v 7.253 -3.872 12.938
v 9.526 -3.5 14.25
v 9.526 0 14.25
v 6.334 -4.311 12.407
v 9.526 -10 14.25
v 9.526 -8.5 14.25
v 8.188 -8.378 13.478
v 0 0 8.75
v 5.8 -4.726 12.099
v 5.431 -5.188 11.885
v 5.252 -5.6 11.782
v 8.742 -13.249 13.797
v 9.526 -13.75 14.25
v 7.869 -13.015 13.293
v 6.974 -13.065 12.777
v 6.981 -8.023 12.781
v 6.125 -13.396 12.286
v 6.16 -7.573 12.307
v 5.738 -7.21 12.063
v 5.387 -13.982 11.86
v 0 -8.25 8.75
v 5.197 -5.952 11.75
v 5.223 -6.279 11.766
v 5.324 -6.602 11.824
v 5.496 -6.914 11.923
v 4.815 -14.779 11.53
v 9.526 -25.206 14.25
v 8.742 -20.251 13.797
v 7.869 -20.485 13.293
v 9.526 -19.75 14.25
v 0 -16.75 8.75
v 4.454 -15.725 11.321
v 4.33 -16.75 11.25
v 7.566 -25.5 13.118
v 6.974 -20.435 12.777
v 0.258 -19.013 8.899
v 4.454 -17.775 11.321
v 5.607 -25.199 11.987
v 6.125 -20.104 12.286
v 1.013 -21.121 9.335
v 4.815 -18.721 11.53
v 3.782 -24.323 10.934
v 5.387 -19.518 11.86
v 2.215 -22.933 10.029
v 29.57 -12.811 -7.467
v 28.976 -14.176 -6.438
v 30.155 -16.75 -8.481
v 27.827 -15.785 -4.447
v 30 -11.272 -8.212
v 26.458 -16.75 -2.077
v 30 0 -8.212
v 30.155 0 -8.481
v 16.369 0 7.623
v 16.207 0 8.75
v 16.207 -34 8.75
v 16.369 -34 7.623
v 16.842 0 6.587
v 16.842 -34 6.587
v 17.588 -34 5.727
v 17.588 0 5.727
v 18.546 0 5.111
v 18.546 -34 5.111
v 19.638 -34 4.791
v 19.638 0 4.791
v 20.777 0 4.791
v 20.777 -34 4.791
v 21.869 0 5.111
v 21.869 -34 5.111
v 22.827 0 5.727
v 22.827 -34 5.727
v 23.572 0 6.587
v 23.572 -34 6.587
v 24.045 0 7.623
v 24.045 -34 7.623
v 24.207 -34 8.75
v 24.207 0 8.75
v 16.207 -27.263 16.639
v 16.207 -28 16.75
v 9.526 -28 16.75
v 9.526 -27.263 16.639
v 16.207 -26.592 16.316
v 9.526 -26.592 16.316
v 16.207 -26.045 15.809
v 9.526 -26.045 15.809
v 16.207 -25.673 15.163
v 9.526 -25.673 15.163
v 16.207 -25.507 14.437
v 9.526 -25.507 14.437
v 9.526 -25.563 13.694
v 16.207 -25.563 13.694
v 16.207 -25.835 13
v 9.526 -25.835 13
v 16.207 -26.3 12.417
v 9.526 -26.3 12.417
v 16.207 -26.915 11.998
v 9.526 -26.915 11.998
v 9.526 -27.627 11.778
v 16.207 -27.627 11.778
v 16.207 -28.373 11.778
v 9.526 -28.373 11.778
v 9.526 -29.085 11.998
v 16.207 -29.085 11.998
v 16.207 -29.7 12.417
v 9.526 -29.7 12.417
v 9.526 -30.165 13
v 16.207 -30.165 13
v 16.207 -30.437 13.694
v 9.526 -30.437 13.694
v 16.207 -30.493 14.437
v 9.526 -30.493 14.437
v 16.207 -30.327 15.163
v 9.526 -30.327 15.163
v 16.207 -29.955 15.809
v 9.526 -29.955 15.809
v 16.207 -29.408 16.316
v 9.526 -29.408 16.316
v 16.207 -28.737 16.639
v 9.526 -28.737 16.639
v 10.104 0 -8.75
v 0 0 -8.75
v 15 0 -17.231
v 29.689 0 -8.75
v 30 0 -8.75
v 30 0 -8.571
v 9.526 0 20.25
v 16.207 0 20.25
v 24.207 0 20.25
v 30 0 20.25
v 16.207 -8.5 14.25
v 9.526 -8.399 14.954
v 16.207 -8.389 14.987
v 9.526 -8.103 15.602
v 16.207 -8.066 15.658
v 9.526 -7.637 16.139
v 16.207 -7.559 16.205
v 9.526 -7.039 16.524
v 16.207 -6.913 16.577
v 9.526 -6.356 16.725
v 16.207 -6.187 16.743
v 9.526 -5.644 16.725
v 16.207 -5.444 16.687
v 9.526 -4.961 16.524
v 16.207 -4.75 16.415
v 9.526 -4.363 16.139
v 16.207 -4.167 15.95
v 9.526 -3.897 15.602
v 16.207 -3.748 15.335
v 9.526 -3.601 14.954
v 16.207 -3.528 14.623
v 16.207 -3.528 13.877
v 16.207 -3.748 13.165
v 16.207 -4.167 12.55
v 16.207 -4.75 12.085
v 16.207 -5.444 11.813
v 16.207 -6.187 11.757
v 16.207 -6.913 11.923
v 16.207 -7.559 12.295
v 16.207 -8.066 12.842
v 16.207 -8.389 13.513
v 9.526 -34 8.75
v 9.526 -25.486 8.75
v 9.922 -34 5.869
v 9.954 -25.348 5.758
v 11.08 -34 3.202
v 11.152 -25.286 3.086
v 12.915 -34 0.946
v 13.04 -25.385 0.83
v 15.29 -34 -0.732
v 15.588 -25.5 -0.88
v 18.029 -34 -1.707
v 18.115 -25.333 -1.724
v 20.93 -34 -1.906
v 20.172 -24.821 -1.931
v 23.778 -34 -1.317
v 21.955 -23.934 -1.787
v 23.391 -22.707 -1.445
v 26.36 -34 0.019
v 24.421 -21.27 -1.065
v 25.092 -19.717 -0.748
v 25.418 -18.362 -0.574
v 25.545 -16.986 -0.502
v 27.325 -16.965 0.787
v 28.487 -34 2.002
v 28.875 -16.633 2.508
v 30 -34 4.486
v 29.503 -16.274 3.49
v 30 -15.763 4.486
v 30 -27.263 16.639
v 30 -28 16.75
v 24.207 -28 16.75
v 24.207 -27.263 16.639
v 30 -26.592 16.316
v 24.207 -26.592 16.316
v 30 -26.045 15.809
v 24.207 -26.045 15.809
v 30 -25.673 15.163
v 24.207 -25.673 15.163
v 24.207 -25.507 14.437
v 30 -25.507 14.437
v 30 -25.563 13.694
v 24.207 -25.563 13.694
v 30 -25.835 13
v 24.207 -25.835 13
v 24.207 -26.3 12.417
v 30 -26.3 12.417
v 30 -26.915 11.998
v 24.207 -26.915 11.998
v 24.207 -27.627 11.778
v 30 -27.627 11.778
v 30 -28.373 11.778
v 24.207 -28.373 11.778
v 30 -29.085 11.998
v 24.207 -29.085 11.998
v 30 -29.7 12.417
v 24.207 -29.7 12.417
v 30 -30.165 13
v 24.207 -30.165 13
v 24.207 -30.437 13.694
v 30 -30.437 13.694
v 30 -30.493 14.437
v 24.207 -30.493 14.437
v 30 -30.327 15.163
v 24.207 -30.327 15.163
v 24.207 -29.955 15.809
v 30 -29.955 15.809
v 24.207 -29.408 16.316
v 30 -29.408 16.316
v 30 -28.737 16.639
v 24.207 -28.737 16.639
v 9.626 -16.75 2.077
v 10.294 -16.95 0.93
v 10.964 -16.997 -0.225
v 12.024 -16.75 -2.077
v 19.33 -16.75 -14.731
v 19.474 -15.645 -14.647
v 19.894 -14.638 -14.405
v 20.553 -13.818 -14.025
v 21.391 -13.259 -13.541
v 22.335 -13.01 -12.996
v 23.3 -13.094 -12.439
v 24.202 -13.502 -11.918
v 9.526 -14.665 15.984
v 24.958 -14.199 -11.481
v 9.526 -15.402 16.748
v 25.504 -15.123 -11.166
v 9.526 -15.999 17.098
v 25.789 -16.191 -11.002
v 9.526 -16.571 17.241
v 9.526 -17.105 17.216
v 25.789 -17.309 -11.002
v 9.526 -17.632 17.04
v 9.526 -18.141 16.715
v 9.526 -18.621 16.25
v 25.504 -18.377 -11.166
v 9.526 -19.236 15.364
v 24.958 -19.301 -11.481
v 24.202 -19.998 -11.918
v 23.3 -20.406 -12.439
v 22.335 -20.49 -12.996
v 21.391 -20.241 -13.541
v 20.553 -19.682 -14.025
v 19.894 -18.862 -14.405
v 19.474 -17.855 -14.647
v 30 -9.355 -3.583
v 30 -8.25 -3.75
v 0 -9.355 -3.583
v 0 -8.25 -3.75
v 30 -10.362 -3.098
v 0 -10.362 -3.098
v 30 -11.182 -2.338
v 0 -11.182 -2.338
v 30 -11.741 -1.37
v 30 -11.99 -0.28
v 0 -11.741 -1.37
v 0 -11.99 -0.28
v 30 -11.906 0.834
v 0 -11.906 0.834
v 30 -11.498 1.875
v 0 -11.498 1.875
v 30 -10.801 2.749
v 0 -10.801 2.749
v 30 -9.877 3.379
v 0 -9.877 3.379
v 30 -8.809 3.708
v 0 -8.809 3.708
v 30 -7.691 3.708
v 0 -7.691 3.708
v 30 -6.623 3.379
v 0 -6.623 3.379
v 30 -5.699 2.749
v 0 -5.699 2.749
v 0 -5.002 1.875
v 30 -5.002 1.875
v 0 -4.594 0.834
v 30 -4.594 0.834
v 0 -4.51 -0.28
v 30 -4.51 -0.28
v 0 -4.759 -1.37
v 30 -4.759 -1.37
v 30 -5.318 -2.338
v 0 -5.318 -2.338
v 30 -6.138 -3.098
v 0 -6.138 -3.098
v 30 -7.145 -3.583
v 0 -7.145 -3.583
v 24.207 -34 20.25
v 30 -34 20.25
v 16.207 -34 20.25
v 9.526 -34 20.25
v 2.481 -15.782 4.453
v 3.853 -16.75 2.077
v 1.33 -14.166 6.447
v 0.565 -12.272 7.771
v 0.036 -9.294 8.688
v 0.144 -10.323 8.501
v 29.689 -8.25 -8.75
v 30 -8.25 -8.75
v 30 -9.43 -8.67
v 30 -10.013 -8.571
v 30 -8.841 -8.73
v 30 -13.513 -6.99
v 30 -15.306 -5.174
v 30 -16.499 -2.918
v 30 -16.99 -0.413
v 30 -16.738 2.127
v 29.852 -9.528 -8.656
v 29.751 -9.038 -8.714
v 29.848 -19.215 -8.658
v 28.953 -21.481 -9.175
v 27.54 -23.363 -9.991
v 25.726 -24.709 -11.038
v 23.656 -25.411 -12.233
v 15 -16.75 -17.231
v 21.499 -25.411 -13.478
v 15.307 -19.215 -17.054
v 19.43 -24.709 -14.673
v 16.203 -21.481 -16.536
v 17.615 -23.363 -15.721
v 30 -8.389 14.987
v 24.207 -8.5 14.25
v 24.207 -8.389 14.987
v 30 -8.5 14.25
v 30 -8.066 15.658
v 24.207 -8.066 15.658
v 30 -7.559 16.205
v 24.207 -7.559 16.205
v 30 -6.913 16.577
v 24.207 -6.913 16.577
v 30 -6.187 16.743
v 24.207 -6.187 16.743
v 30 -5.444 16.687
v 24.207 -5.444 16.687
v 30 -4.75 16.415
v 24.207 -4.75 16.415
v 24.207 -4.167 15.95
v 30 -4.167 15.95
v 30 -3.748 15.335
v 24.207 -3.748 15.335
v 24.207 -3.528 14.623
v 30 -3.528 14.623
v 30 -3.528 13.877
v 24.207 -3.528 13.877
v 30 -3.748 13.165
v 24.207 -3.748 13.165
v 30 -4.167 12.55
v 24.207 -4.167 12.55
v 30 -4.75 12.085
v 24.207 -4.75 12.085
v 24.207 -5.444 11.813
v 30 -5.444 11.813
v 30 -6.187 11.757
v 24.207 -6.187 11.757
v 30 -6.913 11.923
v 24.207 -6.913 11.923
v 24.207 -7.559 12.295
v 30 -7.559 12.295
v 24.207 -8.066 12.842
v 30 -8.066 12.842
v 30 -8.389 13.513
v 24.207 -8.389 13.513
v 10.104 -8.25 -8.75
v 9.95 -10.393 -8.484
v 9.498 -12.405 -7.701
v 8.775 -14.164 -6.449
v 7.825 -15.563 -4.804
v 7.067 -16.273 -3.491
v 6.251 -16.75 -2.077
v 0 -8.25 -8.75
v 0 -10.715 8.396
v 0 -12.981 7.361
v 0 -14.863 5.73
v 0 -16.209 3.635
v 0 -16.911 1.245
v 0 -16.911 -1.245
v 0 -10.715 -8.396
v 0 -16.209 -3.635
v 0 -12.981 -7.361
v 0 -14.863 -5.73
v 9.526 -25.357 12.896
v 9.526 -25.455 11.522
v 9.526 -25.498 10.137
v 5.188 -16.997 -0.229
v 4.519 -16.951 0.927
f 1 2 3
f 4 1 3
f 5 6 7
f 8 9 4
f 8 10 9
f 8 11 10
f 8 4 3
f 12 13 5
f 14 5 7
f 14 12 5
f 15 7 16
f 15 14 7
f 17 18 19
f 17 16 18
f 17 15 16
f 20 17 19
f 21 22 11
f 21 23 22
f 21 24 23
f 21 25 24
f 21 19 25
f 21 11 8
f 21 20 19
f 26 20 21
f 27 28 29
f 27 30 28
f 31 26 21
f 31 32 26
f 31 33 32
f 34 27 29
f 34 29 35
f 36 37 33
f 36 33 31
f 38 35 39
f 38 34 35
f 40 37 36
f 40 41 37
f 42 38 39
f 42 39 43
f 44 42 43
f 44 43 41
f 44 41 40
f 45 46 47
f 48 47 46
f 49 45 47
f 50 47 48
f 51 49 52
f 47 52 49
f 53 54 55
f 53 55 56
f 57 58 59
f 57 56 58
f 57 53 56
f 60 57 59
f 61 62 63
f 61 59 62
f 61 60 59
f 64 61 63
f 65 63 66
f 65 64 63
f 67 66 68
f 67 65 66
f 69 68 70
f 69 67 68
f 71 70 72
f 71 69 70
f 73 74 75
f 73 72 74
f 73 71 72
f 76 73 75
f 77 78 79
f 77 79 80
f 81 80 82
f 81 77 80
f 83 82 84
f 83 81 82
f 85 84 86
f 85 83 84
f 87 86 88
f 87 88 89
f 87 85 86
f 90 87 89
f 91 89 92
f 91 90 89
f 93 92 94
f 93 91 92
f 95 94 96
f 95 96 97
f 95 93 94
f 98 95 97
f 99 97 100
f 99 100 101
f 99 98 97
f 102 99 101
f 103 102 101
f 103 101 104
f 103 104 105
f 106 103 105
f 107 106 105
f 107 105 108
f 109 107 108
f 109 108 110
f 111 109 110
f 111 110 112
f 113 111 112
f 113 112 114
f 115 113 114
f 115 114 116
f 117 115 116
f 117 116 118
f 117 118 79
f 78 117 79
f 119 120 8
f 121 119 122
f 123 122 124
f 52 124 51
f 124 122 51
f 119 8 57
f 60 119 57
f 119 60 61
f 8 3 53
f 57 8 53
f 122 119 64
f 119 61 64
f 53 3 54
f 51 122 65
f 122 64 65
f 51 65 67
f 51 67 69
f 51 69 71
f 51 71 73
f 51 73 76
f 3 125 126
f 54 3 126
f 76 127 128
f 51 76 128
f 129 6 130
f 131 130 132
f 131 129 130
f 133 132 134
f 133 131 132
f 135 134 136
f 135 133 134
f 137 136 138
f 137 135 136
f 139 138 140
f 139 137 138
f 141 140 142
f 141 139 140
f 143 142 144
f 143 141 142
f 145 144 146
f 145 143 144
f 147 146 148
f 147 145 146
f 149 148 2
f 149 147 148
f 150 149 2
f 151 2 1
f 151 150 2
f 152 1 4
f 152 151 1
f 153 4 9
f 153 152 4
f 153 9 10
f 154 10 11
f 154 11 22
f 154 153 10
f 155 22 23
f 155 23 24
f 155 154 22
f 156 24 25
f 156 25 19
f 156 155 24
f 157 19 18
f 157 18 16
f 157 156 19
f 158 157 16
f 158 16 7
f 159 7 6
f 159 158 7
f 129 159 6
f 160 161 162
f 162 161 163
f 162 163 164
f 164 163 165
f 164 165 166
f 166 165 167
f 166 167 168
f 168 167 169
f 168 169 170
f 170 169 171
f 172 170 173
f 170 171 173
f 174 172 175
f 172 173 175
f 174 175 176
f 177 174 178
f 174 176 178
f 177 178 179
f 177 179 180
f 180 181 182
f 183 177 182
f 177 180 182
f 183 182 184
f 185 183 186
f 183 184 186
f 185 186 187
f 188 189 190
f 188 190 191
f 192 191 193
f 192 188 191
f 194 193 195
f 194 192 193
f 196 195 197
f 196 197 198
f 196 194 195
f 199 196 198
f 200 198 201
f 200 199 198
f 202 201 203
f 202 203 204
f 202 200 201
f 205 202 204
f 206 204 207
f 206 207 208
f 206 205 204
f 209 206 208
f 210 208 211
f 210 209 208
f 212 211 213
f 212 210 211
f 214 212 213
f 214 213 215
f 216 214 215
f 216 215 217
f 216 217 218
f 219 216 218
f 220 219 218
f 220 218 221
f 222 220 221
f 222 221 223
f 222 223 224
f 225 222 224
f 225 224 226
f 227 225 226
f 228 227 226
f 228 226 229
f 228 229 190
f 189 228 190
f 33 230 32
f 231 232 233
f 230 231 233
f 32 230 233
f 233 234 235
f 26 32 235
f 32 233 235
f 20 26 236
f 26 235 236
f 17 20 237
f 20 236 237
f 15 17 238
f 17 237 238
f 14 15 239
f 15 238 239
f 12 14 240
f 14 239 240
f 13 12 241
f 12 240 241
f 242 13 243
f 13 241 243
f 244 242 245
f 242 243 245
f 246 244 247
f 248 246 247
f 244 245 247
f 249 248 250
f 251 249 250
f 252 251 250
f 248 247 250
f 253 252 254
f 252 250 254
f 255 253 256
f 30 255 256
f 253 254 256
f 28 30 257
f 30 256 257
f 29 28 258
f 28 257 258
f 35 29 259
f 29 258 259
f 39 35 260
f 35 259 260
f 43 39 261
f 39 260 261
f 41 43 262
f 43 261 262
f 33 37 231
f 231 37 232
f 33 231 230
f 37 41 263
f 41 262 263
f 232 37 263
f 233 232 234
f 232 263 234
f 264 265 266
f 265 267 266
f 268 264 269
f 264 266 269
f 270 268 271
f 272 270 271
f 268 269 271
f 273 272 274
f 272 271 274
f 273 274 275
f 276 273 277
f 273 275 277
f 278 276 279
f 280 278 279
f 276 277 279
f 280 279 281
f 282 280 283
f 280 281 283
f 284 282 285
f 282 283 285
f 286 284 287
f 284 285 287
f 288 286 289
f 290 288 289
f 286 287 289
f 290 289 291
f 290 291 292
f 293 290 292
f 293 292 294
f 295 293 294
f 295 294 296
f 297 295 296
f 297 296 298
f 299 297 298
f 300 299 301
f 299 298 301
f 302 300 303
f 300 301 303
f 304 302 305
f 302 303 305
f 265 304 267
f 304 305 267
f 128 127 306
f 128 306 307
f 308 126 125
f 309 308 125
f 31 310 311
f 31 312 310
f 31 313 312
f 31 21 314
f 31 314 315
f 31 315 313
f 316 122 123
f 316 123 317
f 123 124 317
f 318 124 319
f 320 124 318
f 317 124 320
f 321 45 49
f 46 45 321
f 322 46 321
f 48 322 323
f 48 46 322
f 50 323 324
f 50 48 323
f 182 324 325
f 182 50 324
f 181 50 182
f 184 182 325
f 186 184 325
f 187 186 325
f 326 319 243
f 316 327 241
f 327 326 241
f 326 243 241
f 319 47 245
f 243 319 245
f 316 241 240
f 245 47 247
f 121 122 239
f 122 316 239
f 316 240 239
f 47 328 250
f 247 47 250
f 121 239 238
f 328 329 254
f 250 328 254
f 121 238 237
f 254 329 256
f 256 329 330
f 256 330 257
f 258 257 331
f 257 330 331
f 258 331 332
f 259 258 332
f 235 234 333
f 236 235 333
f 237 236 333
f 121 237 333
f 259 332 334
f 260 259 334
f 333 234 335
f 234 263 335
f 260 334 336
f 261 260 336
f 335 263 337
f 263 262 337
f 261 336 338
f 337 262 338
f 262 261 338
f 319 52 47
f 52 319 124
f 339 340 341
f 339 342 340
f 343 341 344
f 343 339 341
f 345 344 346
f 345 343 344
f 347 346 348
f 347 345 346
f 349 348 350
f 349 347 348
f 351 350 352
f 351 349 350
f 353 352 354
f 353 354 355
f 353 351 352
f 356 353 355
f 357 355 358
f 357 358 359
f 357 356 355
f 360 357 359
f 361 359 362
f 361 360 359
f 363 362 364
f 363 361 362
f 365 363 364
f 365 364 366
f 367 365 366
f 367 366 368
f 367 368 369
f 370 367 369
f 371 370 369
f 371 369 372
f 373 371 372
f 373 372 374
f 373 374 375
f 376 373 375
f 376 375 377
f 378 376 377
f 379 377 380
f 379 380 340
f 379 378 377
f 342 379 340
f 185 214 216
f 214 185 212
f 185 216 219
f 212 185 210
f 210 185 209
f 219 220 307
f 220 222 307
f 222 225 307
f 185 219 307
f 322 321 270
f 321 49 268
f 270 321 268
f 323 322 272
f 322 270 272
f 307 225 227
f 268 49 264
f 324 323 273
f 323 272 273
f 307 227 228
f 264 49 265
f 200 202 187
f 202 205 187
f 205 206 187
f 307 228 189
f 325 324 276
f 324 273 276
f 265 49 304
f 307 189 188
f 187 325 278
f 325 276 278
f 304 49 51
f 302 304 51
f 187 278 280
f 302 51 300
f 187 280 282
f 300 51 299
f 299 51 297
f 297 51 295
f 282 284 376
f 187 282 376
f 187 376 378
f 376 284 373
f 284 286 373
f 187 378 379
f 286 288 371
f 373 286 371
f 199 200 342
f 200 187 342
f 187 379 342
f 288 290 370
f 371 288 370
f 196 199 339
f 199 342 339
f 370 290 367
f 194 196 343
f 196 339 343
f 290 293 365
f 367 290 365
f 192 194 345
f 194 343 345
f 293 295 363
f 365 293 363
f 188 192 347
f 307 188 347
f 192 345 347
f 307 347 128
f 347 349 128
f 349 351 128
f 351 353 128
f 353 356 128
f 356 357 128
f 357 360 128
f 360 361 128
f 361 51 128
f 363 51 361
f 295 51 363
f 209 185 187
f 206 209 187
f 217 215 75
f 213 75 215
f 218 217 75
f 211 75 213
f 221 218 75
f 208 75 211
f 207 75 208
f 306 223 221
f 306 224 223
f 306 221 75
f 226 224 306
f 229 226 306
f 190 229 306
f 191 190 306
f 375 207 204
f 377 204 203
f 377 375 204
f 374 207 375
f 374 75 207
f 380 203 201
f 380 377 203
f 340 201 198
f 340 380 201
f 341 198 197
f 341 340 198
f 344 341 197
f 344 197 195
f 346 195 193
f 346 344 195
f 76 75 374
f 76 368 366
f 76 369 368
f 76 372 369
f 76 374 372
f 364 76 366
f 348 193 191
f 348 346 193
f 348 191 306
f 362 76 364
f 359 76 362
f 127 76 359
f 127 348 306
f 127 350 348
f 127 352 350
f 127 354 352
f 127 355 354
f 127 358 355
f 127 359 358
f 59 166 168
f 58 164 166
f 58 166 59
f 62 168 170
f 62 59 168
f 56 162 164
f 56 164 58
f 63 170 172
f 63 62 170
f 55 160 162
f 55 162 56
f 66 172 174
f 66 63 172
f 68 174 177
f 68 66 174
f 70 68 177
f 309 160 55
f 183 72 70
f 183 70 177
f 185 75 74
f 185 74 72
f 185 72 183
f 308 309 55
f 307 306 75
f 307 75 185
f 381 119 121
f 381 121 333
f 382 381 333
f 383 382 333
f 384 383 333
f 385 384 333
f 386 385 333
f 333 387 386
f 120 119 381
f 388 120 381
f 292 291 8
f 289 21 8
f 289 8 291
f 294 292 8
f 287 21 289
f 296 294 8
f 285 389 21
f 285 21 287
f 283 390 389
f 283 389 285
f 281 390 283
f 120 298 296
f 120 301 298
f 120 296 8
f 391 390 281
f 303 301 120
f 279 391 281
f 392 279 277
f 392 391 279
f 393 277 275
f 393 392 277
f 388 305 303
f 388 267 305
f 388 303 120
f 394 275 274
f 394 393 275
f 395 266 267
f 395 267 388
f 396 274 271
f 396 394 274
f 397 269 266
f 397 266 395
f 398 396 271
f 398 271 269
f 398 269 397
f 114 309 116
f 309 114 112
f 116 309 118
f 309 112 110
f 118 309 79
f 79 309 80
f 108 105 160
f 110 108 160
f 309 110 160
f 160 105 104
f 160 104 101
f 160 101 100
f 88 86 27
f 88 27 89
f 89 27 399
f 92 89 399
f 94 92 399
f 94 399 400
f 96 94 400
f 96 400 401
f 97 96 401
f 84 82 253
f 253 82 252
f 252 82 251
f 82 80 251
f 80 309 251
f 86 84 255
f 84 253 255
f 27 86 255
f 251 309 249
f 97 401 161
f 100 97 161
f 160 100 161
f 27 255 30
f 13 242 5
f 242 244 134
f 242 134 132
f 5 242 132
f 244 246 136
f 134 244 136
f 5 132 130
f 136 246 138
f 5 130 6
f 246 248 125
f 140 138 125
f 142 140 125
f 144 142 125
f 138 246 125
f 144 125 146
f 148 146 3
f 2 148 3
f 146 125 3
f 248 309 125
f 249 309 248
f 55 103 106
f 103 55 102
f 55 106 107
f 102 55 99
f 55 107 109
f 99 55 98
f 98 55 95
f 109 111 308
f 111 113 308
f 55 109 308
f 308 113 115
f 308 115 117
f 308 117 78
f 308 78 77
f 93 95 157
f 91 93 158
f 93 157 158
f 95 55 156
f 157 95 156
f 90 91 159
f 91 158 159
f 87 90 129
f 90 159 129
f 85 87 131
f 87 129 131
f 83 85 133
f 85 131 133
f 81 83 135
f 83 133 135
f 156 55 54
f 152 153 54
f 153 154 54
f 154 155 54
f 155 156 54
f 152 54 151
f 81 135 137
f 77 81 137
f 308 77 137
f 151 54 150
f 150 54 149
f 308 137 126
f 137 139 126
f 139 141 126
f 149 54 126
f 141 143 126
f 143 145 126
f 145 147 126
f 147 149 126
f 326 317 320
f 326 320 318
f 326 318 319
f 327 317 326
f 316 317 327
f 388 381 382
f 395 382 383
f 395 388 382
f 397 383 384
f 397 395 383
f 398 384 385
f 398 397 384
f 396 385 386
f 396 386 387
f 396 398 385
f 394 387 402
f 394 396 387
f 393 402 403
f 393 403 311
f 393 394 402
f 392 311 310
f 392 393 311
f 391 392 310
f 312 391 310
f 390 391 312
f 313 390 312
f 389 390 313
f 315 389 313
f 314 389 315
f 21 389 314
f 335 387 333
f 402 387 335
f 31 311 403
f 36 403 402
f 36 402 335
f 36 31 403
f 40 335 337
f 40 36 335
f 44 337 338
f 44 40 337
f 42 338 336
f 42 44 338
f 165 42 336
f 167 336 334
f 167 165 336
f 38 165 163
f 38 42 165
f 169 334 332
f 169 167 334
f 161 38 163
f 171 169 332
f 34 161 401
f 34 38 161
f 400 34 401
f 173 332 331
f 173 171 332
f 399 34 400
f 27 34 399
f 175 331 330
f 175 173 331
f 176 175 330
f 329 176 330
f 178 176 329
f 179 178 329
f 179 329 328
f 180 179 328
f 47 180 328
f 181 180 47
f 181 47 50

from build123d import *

# Parameters (mm, degrees)
SKETCH1_R               = 3.75
BOSS_EXTRUDE1_DEPTH     = 30
SKETCH2_R               = 3.75
BOSS_EXTRUDE2_DEPTH     = 30
CUT_EXTRUDE1_DEPTH      = 26.5000001
SKETCH4_W               = 5.792740578
SKETCH4_H               = 11.5
BOSS_EXTRUDE3_DEPTH     = 10
BOSS_EXTRUDE4_DEPTH     = 10
BOSS_EXTRUDE5_DEPTH     = 34
SKETCH5_R               = 2.5
CUT_EXTRUDE2_DEPTH      = 31.0000001
SKETCH7_R               = 3.75
CUT_EXTRUDE3_DEPTH      = 31.155444666
SKETCH8_R               = 3.75
CUT_EXTRUDE4_DEPTH      = 27.5
CUT_EXTRUDE4_DEPTH_BACK = 38.57772242


with BuildPart() as part:
    # Sketch1 → Boss-Extrude1 (new body)
    with BuildSketch(Plane(origin=(0, 0, 0), x_dir=(0, 0, -1), z_dir=(1, 0, 0))):
        with BuildLine():
            Line((-8.75, 0), (8.75, 0))
            Line((8.75, 0), (8.75, 8.25))
            ThreePointArc((8.75, 8.25), (0, 17), (-8.75, 8.25))
            Line((-8.75, 8.25), (-8.75, 0))
        make_face()
        with Locations((0, 8.25)):
            Circle(SKETCH1_R, mode=Mode.SUBTRACT)
    extrude(amount=BOSS_EXTRUDE1_DEPTH)

    # Sketch2 → Boss-Extrude2 (add)
    with BuildSketch(Plane(origin=(-3.788861142, 0, 6.5625), x_dir=(-0.866025404, 0, -0.5), z_dir=(0.5, 0, -0.866025404))):
        with BuildLine():
            Line((-4.375, 0), (-4.375, 16.75))
            ThreePointArc((-4.375, 16.75), (-13.125, 25.5), (-21.875, 16.75))
            Line((-21.875, 16.75), (-21.875, 0))
            Line((-21.875, 0), (-4.375, 0))
        make_face()
        with Locations((-13.125, 16.75)):
            Circle(SKETCH2_R, mode=Mode.SUBTRACT)
    extrude(amount=BOSS_EXTRUDE2_DEPTH)

    # Sketch3 → Cut-Extrude1 (cut, through all)
    with BuildSketch(Plane.XZ):
        with BuildLine():
            Line((24.207259422, 8.75), (24.207259422, 15.67820323))
            Line((24.207259422, 15.67820323), (16.207259422, 15.67820323))
            Line((16.207259422, 15.67820323), (16.207259422, 8.75))
            ThreePointArc((16.207259422, 8.75), (20.207259422, 4.75), (24.207259422, 8.75))
        make_face()
    extrude(amount=-CUT_EXTRUDE1_DEPTH, mode=Mode.SUBTRACT)

    # Sketch4 → Boss-Extrude3 (add)
    with BuildSketch(Plane.XZ):
        with Locations((27.103629711, 14.5)):
            Rectangle(SKETCH4_W, SKETCH4_H)
    extrude(amount=-BOSS_EXTRUDE3_DEPTH)

    # Sketch6 → Boss-Extrude4 (add)
    with BuildSketch(Plane.XZ):
        Polygon((16.207259422, 15.67820323), (16.207259422, 20.25), (9.526279442, 20.25), (9.526279442, 14.25), align=None)
    extrude(amount=-BOSS_EXTRUDE4_DEPTH)

    # Sketch9 → Boss-Extrude5 (add)
    with BuildSketch(Plane.XZ):
        with BuildLine():
            Line((16.207259422, 20.25), (9.526279442, 20.25))
            Line((9.526279442, 20.25), (9.526279442, 14.25))
            Line((9.526279442, 14.25), (9.526279442, 8.75))
            ThreePointArc((9.526279442, 8.75), (18.029270984, -1.706562518), (30, 4.485546307))
            Line((30, 4.485546307), (30, 20.25))
            Line((30, 20.25), (24.207259422, 20.25))
            Line((24.207259422, 20.25), (24.207259422, 8.75))
            ThreePointArc((24.207259422, 8.75), (20.207259422, 4.75), (16.207259422, 8.75))
            Line((16.207259422, 8.75), (16.207259422, 20.25))
        make_face()
    extrude(amount=-BOSS_EXTRUDE5_DEPTH)

    # Sketch5 → Cut-Extrude2 (cut, through all)
    with BuildSketch(Plane(origin=(30, 0, 0), x_dir=(0, 0, -1), z_dir=(1, 0, 0))):
        with Locations(Location((-14.25, 6, 0), (0, 0, 90))):  # turned: the seam where the file's is
            Circle(SKETCH5_R)
        with Locations(Location((-14.25, 28, 0), (0, 0, 180))):  # turned: the seam where the file's is
            Circle(SKETCH5_R)
    extrude(amount=-CUT_EXTRUDE2_DEPTH, mode=Mode.SUBTRACT)

    # Sketch7 → Cut-Extrude3 (cut, through all)
    with BuildSketch(Plane.ZY):
        with Locations(Location((0, 8.25, 0), (0, 0, 180))):  # turned: the seam where the file's is
            Circle(SKETCH7_R)
    extrude(amount=-CUT_EXTRUDE3_DEPTH, mode=Mode.SUBTRACT)

    # Sketch8 → Cut-Extrude4 (cut, two sides)
    with BuildSketch(Plane(origin=(-3.788861142, 0, 6.5625), x_dir=(0.866025404, 0, 0.5), z_dir=(-0.5, 0, 0.866025404))) as cut_extrude4_sk:
        with Locations(Location((13.125, 16.75, 0), (0, 0, 53.130102354))):  # turned: the seam where the file's is
            Circle(SKETCH8_R)
    extrude(amount=CUT_EXTRUDE4_DEPTH, mode=Mode.SUBTRACT)
    extrude(cut_extrude4_sk.sketch, amount=-CUT_EXTRUDE4_DEPTH_BACK, mode=Mode.SUBTRACT)


with BuildPart() as body_2:
    # Mirror1: mirrored copy
    add(part.part.mirror(Plane(origin=(30, 0, 8.75), x_dir=(0, 0, 1), z_dir=(0, 1, 0))))


solid = body_2.part
